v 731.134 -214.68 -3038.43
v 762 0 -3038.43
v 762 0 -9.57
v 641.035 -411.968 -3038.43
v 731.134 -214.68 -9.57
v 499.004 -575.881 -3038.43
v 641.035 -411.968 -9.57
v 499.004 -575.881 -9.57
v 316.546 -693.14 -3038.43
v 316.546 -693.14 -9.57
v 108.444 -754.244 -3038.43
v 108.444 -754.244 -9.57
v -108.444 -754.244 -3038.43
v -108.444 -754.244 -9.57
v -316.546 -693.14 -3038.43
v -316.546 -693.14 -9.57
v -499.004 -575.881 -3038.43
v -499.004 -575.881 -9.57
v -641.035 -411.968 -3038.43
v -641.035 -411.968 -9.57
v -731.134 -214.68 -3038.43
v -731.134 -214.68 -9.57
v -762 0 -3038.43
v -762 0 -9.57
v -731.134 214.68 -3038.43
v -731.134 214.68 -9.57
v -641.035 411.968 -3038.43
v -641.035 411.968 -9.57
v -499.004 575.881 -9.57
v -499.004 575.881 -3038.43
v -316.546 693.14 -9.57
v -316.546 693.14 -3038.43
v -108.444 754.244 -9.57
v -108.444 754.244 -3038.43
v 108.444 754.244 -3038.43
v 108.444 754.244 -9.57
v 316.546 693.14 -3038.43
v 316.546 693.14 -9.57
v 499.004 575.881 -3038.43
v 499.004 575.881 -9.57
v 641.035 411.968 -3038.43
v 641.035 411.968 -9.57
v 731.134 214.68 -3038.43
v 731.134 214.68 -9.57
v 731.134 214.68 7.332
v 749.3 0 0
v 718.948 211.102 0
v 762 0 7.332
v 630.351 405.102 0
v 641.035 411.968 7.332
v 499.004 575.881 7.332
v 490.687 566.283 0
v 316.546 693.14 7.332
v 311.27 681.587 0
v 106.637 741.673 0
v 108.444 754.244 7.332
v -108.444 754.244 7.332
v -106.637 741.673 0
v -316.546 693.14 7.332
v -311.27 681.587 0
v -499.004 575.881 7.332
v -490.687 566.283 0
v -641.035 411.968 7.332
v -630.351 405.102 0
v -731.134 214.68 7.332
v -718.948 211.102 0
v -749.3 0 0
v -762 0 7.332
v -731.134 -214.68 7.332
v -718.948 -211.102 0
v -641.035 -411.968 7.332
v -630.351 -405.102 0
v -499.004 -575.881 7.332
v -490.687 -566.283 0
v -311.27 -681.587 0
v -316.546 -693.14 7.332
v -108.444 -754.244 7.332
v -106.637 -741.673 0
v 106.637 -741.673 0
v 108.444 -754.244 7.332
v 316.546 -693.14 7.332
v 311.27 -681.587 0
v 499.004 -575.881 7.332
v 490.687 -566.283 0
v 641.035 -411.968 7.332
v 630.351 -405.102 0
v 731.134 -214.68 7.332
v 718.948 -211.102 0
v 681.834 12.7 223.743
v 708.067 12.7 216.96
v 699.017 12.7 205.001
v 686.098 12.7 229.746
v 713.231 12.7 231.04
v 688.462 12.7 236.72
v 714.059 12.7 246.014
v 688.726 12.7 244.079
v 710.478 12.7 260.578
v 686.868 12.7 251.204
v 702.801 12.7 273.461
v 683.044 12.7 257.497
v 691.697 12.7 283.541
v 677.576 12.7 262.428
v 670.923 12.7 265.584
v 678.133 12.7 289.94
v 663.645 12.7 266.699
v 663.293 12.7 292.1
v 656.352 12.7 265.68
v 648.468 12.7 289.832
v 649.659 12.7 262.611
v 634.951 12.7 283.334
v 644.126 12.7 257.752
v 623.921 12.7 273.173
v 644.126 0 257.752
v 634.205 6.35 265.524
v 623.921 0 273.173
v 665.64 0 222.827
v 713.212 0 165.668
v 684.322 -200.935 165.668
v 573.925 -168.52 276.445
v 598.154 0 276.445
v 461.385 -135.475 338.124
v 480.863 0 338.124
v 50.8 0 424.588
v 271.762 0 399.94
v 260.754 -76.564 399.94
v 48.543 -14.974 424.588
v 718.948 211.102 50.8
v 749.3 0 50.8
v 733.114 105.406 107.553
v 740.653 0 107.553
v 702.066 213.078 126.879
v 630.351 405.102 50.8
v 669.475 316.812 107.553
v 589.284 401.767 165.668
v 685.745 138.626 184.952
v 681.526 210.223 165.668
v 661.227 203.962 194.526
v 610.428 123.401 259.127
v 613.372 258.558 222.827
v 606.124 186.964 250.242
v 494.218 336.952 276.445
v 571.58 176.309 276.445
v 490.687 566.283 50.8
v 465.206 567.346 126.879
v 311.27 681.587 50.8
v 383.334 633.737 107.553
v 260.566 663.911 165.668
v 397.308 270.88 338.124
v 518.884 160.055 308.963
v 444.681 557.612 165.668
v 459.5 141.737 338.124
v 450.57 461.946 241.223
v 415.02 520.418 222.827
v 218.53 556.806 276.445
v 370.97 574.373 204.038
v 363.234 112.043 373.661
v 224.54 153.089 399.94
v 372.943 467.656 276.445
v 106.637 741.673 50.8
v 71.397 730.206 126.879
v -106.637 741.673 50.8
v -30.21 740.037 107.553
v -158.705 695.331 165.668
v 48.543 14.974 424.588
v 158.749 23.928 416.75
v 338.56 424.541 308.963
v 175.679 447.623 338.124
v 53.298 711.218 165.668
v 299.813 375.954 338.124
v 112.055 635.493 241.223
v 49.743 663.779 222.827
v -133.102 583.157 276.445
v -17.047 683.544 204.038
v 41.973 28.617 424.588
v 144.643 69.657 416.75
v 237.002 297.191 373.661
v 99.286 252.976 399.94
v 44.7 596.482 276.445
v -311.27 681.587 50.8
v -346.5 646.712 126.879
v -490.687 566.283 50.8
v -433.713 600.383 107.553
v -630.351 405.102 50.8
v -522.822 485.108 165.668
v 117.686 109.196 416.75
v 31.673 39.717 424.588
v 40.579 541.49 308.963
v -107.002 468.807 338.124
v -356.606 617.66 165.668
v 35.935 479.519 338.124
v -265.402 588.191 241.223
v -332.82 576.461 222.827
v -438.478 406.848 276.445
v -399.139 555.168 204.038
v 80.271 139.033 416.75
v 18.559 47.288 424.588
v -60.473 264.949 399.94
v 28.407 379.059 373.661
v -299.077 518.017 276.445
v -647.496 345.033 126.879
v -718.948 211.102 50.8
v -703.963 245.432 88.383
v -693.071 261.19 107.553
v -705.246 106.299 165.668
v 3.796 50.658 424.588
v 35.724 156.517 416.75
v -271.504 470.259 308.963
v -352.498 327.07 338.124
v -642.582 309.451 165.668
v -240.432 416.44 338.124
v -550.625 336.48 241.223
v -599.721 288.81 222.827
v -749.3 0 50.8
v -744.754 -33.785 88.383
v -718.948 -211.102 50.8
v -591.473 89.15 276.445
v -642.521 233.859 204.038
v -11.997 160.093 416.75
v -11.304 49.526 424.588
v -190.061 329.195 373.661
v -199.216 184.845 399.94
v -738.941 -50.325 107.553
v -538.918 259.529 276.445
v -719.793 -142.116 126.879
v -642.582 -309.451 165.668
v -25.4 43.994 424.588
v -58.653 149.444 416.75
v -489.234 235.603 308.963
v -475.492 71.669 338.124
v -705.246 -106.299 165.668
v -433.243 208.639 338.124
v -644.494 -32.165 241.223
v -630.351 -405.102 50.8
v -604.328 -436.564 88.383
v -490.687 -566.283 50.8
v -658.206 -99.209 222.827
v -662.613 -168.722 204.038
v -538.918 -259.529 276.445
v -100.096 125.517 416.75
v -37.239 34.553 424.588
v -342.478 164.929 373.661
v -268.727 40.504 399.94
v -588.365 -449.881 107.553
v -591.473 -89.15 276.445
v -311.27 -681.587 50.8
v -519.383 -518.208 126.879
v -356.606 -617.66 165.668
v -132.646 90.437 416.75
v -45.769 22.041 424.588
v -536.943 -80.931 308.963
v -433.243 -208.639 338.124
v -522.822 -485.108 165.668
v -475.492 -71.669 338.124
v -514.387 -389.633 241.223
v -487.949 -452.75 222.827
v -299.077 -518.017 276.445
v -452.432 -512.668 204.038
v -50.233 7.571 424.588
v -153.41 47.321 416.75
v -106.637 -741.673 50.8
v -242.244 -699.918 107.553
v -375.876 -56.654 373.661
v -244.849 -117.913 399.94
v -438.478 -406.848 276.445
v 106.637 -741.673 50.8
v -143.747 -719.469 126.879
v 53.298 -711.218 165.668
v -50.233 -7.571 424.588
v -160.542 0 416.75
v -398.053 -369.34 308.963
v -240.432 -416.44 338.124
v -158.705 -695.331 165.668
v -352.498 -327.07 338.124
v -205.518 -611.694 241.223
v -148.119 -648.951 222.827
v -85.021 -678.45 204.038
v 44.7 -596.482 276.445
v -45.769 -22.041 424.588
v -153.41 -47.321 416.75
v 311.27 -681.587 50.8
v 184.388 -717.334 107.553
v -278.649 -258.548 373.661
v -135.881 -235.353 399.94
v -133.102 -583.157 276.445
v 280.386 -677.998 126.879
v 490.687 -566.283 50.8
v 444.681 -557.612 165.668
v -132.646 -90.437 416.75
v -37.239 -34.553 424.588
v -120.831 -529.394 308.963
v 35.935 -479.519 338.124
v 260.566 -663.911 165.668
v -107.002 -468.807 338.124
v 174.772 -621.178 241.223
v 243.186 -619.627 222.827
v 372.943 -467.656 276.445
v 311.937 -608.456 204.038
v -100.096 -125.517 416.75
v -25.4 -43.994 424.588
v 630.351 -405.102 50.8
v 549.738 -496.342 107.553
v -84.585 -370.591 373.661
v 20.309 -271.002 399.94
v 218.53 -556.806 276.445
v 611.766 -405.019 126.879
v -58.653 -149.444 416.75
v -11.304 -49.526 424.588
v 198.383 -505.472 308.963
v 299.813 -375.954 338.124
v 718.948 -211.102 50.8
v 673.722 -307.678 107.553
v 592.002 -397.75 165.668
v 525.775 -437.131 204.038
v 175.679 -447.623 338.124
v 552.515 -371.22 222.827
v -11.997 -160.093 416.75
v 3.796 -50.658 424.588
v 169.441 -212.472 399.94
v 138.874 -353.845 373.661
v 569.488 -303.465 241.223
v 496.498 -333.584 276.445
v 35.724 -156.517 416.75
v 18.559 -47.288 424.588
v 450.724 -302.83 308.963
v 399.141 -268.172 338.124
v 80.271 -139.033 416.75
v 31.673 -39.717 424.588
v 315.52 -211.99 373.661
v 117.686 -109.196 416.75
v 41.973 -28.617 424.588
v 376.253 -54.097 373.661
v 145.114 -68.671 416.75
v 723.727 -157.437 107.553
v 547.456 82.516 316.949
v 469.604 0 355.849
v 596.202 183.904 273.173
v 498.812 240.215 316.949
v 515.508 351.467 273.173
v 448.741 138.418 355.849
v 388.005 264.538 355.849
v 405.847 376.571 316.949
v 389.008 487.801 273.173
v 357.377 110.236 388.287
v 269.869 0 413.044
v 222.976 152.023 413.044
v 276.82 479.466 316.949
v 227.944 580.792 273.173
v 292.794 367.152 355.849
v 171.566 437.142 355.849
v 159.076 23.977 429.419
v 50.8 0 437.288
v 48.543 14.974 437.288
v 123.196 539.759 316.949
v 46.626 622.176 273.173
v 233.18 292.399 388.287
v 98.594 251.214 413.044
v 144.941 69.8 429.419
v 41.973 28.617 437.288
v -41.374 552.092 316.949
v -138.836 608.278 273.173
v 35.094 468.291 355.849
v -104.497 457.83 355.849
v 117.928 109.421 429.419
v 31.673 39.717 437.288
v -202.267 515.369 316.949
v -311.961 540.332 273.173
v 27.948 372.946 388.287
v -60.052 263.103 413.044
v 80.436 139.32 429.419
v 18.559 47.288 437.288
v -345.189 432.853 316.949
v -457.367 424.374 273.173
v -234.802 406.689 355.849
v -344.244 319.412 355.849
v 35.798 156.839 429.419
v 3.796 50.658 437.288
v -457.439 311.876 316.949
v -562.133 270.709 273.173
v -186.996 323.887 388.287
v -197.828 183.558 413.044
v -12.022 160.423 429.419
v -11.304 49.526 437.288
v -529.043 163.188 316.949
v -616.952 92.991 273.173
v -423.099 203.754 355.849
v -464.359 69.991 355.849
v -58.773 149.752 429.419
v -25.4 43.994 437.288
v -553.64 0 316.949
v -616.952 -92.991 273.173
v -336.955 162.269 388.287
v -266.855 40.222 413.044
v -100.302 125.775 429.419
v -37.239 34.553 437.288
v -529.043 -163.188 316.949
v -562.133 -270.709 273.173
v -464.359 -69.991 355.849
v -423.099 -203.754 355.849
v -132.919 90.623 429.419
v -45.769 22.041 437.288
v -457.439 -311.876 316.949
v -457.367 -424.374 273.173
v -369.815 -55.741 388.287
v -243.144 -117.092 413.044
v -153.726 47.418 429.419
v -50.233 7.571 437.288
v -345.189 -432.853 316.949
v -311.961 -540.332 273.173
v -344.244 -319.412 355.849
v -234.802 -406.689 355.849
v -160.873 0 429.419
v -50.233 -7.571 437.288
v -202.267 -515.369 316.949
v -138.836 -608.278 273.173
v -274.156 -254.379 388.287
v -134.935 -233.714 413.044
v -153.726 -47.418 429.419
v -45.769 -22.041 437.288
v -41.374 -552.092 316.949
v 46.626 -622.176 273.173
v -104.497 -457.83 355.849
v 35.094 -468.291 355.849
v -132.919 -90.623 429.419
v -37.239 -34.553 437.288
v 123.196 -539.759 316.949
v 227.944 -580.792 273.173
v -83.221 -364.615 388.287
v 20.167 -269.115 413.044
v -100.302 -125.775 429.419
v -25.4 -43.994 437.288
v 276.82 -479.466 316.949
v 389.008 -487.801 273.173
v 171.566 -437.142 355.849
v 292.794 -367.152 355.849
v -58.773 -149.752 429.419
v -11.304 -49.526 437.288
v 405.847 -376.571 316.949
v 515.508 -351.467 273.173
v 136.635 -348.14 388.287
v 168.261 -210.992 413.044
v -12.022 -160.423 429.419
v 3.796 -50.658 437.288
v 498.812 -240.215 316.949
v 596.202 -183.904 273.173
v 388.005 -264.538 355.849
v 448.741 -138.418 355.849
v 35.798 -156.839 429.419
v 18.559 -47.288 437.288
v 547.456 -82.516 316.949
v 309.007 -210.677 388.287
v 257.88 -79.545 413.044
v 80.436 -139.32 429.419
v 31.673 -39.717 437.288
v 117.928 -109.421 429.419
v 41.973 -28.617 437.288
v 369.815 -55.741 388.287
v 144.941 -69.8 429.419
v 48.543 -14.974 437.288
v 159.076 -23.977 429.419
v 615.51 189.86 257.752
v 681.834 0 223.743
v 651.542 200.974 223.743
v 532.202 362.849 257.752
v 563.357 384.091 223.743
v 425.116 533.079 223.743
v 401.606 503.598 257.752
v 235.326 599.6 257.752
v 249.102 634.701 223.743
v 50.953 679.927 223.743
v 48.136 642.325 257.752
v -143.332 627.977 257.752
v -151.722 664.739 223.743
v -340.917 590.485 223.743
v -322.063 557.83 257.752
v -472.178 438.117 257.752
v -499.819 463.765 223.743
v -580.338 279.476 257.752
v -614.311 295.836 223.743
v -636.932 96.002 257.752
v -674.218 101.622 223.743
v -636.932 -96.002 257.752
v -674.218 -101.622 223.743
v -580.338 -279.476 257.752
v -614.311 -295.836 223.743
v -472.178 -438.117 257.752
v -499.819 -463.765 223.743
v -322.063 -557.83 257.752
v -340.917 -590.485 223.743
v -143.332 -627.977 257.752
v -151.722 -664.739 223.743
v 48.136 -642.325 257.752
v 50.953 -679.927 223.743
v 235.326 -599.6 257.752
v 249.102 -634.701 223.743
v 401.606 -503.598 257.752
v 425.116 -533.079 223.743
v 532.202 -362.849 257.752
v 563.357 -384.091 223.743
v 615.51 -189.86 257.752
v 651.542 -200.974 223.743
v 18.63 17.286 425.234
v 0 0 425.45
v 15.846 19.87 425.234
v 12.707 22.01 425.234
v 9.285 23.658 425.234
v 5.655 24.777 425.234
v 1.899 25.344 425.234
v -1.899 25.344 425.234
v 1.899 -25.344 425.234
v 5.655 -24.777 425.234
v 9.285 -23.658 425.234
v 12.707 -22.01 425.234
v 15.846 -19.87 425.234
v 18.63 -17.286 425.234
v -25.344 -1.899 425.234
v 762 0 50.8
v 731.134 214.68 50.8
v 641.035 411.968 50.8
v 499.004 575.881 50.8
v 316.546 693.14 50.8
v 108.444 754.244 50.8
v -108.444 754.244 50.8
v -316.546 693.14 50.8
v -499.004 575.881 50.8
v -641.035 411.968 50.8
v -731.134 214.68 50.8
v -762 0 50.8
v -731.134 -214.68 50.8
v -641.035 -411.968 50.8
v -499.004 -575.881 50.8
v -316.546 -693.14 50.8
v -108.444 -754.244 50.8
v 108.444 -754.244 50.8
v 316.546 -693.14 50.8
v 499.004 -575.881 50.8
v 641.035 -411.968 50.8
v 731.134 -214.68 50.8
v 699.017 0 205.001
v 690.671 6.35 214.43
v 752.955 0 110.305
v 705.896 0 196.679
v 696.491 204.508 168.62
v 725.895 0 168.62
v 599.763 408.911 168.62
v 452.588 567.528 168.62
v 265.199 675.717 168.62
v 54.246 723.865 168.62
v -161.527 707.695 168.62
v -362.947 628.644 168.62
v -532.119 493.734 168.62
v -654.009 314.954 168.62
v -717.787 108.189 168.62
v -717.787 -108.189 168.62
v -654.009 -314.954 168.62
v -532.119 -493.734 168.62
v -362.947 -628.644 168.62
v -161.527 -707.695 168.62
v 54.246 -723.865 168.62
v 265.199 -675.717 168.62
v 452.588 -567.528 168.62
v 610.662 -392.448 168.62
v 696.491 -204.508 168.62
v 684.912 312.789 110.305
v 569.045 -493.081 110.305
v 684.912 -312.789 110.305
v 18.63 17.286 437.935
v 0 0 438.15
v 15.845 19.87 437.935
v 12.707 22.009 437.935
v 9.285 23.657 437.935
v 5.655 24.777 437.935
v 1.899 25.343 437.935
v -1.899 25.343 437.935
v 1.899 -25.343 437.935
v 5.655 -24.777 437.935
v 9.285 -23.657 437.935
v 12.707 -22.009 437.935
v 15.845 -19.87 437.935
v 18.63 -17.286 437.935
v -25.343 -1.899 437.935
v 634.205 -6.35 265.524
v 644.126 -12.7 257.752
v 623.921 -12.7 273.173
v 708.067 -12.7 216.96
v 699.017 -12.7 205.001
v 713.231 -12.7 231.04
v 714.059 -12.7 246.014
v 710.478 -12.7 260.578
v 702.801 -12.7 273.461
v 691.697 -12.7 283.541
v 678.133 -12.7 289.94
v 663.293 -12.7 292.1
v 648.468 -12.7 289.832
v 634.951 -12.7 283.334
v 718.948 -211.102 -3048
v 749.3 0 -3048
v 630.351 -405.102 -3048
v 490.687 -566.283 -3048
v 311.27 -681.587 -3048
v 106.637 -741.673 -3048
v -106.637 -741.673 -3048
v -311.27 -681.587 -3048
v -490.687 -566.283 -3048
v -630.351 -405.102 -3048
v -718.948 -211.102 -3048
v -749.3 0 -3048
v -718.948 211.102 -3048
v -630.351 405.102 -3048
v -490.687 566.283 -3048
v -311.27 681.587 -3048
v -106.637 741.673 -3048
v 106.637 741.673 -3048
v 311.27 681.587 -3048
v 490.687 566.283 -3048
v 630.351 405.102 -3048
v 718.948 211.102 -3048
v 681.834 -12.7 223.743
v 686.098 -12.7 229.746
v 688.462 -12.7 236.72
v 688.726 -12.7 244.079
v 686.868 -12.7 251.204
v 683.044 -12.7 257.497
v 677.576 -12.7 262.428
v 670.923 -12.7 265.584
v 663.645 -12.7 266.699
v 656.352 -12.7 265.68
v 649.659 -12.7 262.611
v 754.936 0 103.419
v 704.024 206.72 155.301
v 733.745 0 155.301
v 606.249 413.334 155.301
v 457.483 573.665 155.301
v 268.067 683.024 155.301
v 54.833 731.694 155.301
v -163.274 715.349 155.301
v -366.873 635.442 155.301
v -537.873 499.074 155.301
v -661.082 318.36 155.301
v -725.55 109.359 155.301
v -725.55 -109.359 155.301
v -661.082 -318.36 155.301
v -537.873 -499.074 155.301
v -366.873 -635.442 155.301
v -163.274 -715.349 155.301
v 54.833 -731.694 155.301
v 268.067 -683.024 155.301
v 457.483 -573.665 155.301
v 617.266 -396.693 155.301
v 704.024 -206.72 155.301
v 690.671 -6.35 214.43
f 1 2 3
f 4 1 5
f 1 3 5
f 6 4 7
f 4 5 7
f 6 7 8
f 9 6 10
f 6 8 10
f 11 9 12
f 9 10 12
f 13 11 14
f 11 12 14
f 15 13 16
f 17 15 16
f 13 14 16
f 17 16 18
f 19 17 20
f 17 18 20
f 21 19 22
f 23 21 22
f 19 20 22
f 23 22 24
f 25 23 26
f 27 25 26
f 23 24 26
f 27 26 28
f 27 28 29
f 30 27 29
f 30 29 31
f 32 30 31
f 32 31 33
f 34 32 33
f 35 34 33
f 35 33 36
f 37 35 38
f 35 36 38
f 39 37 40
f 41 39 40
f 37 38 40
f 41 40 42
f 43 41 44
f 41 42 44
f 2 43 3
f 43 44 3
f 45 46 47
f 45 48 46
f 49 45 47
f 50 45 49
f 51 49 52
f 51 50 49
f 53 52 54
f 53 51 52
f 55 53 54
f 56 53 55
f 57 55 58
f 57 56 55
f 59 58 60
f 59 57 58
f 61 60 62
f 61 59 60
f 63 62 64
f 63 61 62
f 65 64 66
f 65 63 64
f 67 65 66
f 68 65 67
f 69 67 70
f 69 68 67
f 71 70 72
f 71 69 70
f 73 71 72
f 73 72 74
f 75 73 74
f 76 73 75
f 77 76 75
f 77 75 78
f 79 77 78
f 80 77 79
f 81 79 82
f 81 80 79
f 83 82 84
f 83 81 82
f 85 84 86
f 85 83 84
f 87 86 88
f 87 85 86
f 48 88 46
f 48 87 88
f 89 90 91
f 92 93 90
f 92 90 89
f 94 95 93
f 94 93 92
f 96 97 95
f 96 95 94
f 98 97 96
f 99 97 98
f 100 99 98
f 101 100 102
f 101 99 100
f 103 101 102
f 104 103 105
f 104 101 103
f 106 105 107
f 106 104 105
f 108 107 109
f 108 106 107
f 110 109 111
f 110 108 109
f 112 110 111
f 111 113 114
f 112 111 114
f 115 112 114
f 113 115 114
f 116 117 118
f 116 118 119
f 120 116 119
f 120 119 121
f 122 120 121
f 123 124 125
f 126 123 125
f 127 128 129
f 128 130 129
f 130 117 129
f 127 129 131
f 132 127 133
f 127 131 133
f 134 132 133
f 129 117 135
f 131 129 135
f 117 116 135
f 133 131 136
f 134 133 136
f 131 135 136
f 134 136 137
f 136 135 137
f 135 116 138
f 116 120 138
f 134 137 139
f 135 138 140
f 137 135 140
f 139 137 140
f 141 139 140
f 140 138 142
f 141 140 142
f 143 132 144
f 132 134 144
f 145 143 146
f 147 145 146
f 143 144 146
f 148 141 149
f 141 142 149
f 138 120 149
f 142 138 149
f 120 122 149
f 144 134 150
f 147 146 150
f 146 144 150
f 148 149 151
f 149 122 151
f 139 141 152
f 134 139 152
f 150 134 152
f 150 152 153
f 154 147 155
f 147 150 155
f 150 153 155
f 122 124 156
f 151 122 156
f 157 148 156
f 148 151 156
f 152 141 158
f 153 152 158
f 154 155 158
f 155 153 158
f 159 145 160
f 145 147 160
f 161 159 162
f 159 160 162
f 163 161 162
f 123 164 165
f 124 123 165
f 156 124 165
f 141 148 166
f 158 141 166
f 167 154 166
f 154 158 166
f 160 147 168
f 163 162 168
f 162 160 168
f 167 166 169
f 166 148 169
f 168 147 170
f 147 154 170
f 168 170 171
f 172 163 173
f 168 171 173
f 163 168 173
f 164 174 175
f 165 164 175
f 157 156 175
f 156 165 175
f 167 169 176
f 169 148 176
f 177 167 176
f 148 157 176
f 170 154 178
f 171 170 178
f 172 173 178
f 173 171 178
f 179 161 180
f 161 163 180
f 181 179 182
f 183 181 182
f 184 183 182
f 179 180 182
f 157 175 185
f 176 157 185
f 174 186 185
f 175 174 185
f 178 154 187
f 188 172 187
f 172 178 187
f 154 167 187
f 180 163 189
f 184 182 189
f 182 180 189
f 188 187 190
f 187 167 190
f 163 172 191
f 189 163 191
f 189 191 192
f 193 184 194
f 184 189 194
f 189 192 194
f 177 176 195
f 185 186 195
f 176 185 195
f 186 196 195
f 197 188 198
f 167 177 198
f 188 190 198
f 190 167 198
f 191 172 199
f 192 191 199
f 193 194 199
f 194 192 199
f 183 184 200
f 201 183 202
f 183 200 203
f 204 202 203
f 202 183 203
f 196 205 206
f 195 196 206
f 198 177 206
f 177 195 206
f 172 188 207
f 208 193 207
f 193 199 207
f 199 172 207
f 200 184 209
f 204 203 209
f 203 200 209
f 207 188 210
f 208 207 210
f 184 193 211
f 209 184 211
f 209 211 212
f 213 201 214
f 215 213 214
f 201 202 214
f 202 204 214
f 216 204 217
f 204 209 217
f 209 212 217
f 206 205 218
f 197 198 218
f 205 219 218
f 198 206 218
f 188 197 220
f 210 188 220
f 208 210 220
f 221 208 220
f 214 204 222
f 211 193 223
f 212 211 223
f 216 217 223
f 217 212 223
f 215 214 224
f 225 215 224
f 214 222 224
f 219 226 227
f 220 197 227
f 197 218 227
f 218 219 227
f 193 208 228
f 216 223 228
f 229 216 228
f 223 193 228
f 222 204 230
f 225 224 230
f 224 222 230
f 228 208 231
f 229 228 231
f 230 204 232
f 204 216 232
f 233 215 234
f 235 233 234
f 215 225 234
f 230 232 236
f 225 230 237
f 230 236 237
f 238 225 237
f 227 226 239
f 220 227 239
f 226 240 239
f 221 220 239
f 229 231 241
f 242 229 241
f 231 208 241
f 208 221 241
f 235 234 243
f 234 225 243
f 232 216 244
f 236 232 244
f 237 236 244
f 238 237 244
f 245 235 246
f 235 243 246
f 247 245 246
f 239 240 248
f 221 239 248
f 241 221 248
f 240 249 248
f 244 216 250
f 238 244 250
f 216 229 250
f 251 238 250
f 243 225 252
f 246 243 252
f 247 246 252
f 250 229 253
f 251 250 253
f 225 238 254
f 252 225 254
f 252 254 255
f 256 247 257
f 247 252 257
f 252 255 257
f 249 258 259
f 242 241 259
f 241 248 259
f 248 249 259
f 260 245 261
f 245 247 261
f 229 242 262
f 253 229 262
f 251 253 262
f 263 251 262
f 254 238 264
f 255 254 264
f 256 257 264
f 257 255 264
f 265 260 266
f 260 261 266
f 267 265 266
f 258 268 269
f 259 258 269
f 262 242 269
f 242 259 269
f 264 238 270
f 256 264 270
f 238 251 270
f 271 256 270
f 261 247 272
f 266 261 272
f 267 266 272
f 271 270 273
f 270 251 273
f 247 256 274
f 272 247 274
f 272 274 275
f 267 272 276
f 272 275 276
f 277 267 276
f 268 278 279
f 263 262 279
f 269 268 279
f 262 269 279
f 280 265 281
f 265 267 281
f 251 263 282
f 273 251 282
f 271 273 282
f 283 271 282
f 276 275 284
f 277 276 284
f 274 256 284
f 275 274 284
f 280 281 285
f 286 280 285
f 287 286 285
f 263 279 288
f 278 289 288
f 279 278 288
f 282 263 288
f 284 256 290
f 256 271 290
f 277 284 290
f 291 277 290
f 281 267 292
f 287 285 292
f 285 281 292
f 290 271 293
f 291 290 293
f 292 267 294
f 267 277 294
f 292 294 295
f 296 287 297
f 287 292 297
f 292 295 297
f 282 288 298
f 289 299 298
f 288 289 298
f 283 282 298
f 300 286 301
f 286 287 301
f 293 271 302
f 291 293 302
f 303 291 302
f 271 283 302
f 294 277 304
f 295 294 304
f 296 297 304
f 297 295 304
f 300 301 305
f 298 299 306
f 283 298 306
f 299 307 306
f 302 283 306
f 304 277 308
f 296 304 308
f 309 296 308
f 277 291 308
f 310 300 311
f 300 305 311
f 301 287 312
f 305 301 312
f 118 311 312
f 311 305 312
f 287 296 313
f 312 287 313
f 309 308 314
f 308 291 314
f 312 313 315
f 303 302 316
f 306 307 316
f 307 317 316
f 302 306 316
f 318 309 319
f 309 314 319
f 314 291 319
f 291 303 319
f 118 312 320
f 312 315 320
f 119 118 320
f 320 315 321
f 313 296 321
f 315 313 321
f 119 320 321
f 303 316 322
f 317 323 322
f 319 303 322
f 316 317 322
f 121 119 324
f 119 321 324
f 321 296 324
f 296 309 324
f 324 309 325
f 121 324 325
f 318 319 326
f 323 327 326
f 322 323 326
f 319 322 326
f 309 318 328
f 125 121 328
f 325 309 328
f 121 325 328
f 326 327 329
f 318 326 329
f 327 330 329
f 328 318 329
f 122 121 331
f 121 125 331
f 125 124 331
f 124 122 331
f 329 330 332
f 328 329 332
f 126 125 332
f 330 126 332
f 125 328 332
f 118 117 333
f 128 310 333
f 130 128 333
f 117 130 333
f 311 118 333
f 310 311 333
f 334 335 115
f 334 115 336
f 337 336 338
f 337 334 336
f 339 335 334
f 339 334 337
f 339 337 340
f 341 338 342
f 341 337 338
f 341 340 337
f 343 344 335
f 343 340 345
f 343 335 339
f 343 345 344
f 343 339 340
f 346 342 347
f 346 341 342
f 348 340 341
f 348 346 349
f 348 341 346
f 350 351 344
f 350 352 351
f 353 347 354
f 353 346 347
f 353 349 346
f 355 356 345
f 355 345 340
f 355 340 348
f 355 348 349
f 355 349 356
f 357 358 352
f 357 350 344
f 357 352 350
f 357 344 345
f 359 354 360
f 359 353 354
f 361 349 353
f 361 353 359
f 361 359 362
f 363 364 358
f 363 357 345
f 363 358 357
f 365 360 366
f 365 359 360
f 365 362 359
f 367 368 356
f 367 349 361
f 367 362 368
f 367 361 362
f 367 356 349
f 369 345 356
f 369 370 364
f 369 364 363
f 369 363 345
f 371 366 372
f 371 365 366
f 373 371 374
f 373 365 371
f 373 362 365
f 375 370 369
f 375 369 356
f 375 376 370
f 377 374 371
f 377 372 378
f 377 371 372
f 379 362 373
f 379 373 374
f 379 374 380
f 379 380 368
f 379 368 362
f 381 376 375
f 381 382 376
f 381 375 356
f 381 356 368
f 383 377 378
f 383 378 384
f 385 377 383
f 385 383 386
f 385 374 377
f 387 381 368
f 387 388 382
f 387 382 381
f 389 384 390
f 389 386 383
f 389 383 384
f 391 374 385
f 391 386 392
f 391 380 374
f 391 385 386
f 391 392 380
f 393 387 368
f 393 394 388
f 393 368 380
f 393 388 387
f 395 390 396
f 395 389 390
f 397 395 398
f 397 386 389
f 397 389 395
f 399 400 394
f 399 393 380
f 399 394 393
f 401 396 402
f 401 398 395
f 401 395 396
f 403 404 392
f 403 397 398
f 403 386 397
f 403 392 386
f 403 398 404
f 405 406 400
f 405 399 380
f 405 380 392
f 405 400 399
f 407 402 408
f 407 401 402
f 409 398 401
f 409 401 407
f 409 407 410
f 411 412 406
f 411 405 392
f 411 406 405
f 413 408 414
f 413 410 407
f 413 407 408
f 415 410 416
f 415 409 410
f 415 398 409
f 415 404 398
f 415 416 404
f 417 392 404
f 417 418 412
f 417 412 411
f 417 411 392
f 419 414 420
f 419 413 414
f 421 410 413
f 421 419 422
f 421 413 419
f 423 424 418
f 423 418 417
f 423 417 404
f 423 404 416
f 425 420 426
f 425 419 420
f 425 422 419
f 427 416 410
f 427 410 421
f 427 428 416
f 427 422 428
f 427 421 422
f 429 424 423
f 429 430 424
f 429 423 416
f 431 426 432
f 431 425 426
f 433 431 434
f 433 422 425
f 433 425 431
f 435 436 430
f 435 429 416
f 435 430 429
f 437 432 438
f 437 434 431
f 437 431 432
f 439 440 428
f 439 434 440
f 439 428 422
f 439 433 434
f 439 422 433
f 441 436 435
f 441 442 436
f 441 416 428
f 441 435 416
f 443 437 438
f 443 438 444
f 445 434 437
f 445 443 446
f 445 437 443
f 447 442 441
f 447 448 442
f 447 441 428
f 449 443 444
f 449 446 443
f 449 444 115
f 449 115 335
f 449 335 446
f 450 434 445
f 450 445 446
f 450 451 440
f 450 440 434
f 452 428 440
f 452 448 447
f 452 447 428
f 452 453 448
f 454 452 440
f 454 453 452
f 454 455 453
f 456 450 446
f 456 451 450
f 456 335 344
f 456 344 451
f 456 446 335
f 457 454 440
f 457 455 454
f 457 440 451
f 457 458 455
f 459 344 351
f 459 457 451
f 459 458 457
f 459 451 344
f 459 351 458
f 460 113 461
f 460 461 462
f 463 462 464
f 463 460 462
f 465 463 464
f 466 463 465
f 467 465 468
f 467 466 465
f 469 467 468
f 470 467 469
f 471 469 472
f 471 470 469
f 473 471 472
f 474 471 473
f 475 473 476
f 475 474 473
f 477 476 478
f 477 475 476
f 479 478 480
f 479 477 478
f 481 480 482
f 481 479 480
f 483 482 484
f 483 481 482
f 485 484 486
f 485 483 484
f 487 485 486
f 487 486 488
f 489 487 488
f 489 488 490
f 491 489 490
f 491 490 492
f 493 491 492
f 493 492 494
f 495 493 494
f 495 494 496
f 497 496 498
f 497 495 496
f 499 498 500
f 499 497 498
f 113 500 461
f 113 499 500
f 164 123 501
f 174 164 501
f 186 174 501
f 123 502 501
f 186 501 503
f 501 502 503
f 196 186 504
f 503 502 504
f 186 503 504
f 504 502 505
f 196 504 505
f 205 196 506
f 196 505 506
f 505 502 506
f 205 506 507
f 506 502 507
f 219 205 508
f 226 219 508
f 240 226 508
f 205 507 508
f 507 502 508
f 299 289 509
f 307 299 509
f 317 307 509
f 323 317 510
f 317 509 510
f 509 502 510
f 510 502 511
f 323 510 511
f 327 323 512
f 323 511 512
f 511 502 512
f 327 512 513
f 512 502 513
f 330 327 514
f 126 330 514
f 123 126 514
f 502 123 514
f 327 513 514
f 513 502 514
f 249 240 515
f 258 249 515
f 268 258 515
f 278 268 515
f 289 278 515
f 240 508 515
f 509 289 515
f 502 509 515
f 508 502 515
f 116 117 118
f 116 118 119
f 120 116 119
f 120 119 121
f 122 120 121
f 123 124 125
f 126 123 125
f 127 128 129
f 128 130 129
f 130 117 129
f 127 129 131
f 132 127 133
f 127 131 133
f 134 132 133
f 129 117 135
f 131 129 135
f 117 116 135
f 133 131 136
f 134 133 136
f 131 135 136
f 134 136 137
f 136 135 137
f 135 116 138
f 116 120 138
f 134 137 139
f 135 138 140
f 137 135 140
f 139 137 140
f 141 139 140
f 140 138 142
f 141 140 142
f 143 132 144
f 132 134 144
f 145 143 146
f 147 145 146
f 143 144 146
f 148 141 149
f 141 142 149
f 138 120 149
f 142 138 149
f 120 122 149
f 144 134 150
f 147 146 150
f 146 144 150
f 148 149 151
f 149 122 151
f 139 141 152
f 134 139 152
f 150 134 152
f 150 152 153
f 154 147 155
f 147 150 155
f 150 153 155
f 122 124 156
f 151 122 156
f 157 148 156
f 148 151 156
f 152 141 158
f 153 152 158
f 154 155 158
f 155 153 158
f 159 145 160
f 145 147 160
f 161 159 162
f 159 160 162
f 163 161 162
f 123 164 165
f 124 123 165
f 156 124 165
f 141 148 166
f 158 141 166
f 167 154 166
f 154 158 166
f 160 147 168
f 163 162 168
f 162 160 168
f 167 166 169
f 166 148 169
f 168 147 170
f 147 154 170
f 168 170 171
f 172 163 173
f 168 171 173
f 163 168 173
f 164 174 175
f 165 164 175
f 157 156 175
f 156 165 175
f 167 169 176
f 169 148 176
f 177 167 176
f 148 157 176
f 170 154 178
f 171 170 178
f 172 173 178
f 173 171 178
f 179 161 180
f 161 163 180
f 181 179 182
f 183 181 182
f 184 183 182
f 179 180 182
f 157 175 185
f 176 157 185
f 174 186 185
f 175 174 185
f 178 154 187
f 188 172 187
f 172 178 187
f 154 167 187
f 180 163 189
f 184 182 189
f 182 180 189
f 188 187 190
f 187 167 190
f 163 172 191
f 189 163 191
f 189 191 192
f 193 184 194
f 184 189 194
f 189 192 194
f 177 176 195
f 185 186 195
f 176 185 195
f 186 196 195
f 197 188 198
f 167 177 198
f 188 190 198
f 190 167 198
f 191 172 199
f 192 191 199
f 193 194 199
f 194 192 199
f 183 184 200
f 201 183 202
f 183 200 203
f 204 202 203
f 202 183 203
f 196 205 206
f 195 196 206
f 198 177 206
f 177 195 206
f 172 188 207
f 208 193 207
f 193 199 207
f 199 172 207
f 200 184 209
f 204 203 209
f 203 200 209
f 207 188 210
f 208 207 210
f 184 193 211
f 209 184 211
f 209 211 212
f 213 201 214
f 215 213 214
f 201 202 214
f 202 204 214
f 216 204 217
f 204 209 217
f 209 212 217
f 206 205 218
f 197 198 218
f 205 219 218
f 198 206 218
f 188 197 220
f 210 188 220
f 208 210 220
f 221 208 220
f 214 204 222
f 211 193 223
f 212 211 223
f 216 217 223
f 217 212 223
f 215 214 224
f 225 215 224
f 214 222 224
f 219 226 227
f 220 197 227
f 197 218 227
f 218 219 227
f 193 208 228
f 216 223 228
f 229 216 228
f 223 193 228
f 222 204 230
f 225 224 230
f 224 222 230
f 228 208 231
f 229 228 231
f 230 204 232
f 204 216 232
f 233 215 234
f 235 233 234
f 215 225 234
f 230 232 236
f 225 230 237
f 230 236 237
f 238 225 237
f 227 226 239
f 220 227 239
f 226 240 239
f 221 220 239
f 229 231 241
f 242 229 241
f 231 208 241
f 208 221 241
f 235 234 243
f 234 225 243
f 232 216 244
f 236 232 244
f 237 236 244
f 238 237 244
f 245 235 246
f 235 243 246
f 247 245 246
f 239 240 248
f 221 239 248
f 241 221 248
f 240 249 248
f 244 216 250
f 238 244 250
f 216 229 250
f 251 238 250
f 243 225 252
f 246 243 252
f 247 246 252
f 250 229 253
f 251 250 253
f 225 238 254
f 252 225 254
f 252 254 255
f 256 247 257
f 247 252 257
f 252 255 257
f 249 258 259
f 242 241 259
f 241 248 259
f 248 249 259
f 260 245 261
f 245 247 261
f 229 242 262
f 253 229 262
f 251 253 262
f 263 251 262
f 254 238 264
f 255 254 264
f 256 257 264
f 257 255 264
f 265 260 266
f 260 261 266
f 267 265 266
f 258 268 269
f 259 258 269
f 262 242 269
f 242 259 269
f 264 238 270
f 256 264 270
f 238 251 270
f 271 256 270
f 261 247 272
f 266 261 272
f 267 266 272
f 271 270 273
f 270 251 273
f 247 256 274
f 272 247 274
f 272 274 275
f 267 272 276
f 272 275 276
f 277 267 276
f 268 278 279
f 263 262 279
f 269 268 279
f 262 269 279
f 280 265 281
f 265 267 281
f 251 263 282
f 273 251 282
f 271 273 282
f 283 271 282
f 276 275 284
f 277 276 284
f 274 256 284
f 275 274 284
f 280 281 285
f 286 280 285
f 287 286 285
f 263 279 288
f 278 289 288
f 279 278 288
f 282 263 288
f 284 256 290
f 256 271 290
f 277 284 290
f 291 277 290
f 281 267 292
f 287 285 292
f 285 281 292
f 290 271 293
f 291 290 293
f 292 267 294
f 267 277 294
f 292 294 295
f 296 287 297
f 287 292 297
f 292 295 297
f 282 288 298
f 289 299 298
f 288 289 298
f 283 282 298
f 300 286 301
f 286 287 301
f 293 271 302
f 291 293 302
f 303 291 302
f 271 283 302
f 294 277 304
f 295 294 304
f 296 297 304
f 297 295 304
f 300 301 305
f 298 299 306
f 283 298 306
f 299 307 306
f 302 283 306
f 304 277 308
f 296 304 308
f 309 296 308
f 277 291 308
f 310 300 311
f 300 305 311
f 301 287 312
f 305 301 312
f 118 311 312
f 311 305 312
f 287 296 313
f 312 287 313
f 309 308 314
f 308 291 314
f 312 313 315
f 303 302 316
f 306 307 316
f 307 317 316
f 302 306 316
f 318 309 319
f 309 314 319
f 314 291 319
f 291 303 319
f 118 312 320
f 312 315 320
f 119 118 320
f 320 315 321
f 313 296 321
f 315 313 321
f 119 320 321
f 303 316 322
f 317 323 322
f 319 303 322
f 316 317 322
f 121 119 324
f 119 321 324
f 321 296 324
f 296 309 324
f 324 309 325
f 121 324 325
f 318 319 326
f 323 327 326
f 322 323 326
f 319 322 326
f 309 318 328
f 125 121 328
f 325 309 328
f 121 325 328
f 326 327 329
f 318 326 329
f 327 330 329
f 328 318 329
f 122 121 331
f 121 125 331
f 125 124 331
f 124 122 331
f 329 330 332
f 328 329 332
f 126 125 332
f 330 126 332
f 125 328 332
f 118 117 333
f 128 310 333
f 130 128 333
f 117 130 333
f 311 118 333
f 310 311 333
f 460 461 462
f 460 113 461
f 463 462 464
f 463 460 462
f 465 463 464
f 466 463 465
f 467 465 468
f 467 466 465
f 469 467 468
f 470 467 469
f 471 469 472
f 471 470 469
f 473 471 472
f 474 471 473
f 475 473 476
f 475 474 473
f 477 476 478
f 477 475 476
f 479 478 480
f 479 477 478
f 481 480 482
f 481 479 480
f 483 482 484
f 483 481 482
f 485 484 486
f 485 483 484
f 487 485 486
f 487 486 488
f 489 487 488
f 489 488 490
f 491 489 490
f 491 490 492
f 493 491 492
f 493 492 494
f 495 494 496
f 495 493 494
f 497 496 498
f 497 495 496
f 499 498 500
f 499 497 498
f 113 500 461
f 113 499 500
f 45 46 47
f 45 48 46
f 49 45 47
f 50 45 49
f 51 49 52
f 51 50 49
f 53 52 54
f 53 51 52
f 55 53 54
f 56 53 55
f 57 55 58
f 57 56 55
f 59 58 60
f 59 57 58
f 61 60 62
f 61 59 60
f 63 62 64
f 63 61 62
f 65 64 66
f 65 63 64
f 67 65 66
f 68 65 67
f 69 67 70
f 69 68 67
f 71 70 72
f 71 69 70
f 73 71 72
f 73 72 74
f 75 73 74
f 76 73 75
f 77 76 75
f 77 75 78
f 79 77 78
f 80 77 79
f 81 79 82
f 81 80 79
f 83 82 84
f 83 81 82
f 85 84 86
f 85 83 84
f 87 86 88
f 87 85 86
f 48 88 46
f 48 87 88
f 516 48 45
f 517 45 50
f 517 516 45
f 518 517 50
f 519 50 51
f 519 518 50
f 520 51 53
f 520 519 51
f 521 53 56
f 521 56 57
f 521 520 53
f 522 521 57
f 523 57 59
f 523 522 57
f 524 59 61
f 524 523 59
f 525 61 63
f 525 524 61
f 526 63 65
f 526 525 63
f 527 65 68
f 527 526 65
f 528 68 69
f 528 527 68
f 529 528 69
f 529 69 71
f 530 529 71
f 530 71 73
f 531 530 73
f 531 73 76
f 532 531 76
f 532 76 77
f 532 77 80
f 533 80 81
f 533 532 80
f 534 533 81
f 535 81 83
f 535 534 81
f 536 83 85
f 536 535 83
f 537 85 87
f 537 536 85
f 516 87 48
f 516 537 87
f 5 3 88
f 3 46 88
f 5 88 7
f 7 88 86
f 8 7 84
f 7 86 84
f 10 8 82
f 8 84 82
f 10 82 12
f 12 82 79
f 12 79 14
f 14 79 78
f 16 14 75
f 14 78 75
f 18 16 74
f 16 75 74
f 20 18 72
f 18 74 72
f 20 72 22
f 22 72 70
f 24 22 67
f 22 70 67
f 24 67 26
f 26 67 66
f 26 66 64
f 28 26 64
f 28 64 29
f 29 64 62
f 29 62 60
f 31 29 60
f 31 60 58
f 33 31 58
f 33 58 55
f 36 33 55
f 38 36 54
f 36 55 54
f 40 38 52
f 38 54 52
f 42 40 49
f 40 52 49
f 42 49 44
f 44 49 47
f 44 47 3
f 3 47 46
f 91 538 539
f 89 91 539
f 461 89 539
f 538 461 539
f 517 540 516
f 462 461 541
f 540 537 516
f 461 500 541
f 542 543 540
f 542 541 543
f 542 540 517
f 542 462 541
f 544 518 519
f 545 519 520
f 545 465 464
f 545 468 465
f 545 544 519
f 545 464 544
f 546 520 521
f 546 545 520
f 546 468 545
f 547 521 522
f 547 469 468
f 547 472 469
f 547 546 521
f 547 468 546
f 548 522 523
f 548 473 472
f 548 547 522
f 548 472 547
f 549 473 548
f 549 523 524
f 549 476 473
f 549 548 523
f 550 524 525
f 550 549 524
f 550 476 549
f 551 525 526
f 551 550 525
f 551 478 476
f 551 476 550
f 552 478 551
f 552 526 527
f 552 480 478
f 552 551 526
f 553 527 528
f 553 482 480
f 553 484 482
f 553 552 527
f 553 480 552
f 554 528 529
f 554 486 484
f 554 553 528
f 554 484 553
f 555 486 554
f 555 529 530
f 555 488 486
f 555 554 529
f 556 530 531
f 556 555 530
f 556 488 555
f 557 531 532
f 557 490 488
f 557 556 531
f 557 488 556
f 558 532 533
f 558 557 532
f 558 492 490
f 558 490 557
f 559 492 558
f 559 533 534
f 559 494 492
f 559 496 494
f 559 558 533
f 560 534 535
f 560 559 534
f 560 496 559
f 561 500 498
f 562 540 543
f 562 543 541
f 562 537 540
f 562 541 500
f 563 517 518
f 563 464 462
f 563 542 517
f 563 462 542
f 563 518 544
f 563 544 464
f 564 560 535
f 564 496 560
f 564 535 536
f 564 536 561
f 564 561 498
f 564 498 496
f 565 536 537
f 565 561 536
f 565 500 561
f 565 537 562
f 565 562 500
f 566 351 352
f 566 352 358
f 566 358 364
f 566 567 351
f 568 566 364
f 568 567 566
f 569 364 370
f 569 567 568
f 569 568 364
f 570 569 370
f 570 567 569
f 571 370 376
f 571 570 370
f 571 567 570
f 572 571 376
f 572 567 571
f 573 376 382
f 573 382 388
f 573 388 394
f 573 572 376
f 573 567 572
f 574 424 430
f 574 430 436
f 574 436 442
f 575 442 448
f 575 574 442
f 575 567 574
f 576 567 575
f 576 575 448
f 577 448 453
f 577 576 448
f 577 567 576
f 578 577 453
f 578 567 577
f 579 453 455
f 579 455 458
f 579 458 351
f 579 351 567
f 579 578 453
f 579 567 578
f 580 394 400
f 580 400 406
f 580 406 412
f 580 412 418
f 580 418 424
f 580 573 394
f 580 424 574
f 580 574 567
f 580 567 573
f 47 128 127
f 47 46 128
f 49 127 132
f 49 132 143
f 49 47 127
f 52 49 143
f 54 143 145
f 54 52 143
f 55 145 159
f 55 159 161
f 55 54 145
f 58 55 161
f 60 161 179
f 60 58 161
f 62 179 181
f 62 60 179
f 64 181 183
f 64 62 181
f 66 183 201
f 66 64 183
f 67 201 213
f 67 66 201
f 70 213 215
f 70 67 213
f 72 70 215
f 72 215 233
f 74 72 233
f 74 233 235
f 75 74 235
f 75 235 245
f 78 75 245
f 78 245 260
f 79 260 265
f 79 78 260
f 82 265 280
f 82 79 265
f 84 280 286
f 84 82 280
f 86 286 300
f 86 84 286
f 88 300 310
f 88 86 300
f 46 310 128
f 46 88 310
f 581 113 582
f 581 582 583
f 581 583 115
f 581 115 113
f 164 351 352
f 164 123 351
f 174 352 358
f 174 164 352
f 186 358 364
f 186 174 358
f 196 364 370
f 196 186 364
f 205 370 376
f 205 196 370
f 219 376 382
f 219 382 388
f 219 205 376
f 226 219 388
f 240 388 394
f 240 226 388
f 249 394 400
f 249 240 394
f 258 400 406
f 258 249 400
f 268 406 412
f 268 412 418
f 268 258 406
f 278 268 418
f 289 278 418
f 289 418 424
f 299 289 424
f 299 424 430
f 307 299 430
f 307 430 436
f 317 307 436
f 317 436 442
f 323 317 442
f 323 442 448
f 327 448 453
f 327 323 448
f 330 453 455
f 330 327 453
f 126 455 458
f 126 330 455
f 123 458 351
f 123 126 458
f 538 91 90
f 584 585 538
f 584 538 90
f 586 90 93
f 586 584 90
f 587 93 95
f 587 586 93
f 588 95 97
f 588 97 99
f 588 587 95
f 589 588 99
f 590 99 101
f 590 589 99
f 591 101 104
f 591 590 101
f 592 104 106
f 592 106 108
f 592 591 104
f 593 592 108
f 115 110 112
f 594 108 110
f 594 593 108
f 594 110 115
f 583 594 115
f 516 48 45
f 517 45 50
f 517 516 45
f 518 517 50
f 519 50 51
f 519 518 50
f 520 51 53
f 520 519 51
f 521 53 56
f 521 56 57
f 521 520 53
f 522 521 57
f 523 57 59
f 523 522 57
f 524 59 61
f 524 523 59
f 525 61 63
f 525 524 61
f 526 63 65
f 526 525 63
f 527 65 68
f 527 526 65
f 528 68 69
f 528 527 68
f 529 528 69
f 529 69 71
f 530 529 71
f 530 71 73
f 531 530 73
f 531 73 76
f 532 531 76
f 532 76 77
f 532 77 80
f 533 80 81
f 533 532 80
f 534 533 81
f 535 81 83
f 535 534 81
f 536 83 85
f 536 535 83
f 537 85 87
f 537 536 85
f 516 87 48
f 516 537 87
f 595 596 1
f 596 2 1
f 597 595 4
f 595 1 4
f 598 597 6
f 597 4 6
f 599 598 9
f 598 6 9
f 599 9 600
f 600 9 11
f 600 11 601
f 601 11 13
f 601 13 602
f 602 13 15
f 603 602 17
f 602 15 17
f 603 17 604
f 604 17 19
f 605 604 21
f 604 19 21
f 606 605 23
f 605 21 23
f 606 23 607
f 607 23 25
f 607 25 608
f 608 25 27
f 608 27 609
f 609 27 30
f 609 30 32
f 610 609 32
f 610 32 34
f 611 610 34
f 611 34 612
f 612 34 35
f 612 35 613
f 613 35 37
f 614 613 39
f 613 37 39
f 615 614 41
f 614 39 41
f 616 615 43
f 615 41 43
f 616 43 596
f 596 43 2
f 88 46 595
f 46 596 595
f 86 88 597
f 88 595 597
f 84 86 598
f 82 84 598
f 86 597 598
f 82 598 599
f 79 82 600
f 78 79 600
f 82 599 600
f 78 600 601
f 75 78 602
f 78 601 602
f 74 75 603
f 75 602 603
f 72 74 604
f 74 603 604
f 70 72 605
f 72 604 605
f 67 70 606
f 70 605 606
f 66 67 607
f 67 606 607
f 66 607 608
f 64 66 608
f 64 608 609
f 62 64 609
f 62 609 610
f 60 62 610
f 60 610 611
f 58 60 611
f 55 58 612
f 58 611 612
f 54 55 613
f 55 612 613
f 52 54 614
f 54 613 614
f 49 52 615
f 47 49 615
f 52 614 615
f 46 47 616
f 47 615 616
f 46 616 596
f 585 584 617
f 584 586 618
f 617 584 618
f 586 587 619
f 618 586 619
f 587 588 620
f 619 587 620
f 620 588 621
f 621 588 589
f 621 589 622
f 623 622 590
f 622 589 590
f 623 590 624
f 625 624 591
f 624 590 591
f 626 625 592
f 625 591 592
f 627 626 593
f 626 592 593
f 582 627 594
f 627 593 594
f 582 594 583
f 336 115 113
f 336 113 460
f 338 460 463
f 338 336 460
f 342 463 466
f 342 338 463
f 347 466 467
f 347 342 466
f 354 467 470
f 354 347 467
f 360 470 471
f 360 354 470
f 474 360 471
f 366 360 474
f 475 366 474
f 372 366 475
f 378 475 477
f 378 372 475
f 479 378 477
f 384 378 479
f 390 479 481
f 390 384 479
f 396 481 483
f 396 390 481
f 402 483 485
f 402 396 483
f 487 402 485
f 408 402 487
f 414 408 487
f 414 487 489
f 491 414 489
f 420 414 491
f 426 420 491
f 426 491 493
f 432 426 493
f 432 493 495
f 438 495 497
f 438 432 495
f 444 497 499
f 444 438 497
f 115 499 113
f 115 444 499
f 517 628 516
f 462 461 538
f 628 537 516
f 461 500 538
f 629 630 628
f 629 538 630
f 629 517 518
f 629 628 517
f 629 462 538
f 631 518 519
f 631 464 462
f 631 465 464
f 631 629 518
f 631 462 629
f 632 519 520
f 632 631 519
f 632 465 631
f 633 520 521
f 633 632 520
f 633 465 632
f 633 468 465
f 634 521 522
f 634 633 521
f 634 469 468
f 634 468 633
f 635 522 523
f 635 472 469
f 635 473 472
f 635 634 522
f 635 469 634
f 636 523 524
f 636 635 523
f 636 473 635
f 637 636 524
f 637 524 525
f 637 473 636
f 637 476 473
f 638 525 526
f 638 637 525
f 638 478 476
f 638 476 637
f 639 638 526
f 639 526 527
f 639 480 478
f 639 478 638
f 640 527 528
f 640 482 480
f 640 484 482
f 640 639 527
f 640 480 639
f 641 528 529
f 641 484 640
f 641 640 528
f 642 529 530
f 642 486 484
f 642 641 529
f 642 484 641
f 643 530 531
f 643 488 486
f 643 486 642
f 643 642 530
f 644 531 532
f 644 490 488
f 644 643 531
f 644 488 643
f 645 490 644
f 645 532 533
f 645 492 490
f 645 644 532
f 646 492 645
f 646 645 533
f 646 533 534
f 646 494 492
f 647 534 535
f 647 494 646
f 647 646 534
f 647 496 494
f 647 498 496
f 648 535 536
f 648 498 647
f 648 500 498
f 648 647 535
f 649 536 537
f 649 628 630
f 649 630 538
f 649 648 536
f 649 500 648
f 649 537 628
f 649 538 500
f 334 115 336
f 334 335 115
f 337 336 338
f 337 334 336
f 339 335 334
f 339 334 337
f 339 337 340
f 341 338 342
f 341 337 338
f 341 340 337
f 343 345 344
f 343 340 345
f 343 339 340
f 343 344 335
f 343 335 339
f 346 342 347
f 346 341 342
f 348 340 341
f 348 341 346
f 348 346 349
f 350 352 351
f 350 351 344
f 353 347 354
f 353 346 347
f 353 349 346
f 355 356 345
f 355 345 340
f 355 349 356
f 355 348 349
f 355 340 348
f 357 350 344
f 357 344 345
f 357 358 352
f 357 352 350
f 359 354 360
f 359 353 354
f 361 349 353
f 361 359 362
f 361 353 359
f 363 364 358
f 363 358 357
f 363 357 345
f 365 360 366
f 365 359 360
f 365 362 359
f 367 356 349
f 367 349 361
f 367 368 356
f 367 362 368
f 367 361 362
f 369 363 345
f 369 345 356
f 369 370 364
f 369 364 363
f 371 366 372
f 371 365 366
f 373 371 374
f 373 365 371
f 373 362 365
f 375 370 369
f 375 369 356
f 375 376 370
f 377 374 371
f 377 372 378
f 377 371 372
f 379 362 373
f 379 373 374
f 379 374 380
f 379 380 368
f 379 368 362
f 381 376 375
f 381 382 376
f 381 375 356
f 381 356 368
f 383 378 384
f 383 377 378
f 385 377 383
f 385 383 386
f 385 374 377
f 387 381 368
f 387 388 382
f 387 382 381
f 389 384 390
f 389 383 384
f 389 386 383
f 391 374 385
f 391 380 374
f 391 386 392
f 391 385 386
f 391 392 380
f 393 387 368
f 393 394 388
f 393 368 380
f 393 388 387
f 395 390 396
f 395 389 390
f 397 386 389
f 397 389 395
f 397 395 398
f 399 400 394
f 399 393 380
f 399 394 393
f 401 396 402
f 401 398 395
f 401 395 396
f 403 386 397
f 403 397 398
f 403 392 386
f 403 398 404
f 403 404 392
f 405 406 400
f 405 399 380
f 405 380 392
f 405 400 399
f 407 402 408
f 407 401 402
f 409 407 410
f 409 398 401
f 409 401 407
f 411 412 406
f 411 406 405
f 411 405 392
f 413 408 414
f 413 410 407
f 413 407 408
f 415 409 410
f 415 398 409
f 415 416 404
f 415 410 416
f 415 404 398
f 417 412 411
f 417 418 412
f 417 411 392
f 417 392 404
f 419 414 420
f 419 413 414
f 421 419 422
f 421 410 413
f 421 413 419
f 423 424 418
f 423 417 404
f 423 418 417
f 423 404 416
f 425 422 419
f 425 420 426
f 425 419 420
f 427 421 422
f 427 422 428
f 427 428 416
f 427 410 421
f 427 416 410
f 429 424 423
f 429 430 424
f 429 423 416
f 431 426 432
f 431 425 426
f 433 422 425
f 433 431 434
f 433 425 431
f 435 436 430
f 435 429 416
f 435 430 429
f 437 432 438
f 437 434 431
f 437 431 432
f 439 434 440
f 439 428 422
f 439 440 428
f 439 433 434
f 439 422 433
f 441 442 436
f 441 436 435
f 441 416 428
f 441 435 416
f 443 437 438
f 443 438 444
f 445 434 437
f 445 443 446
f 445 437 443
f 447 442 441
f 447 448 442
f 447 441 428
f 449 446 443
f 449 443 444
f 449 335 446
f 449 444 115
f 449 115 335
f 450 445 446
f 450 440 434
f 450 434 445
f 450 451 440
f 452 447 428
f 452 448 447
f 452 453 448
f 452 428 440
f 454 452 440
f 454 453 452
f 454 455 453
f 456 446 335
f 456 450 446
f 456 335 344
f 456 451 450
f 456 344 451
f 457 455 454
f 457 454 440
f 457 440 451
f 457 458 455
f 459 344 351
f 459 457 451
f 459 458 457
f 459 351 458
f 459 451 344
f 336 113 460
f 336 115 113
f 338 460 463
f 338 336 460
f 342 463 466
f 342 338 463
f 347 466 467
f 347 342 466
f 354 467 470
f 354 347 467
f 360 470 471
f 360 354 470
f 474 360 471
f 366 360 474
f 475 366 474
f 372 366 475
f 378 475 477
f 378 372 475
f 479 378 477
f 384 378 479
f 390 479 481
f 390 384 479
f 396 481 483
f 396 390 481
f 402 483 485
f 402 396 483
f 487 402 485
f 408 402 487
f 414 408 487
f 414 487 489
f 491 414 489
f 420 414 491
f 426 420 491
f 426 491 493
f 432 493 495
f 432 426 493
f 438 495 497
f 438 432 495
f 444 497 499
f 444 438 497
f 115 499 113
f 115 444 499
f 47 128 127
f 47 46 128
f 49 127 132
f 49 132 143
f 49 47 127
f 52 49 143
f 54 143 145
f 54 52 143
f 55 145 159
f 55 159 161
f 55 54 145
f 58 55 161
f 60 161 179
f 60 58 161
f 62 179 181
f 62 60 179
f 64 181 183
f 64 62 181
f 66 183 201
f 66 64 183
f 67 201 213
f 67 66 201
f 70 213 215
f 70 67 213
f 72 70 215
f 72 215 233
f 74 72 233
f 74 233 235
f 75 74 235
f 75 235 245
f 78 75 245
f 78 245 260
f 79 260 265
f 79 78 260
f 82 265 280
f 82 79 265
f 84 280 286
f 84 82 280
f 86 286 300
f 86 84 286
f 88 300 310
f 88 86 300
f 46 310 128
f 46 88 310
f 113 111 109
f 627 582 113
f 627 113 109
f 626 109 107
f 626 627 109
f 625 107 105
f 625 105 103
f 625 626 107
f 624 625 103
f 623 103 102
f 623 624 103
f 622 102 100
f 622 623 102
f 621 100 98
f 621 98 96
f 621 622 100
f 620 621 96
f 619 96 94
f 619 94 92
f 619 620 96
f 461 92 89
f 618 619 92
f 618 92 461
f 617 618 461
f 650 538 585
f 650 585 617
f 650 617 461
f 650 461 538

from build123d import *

# Parameters (mm, degrees)
F2_DEPTH = 12.7


with BuildPart() as f1:
    # F0 (on Front) → F1 (revolve)
    with BuildSketch(Plane.XZ):
        with BuildLine():
            Line((749.3, 50.8), (749.3, 0))
            Line((749.3, 0), (762, 7.3323484187))
            Line((762, 7.3323484187), (762, 50.8))
            add(Edge.make_bspline(
                [(762, 50.8), (762, 131.2241999089), (699.0172358285, 205.0009740743)],
                knots=[0, 0, 0, 0.4094360974, 0.4094360974, 0.4094360974], degree=2, weights=[1, 0.9791183416, 1]))
            add(Edge.make_bspline(
                [(699.0172358285, 205.0009740743), (690.9176289865, 214.4886946066), (681.8335632743, 223.7431821446)],
                knots=[0.4094360974, 0.4094360974, 0.4094360974, 0.4628251519, 0.4628251519, 0.4628251519], degree=2, weights=[1, 0.9996437223, 1]))
            add(Edge.make_bspline(
                [(681.8335632743, 223.7431821446), (664.6677239017, 241.2310616458), (644.1262863112, 257.7518131682)],
                knots=[0.4628251519, 0.4628251519, 0.4628251519, 0.5636510386, 0.5636510386, 0.5636510386], degree=2, weights=[1, 0.9987295367, 1]))
            add(Edge.make_bspline(
                [(644.1262863112, 257.7518131682), (634.3865563599, 265.5851333879), (623.9210747916, 273.1727348794)],
                knots=[0.5636510386, 0.5636510386, 0.5636510386, 0.6114890844, 0.6114890844, 0.6114890844], degree=2, weights=[1, 0.9997139538, 1]))
            add(Edge.make_bspline(
                [(623.9210747916, 273.1727348794), (414.6015402479, 424.9319446319), (50.8, 437.2882636712)],
                knots=[0.6114890844, 0.6114890844, 0.6114890844, 1.5040801784, 1.5040801784, 1.5040801784], degree=2, weights=[1, 0.9020522297, 1]))
            Line((50.8, 437.2882636712), (50.8, 424.5879913801))
            add(Edge.make_bspline(
                [(749.3, 50.8), (749.3, 400.8554204989), (50.8, 424.5879913801)],
                knots=[0, 0, 0, 1.5029476724, 1.5029476724, 1.5029476724], degree=2, weights=[1, 0.7306834507, 1]))
        make_face()
    revolve(axis=Axis((0, 0, 238.125), (0, 0, 1)))

    # F0 (on Front) → F2 (join, symmetric)
    with BuildSketch(Plane.XZ):
        with BuildLine():
            add(Edge.make_bspline(
                [(699.0172358285, 205.0009740743), (690.9176289865, 214.4886946066), (681.8335632743, 223.7431821446)],
                knots=[0.4094360974, 0.4094360974, 0.4094360974, 0.4628251519, 0.4628251519, 0.4628251519], degree=2, weights=[1, 0.9996437223, 1]))
            ThreePointArc((699.0172358285, 205.0009740743), (697.6232713112, 278.913247184), (623.9210747916, 273.1727348794))
            add(Edge.make_bspline(
                [(644.1262863112, 257.7518131682), (634.3865563599, 265.5851333879), (623.9210747916, 273.1727348794)],
                knots=[0.5636510386, 0.5636510386, 0.5636510386, 0.6114890844, 0.6114890844, 0.6114890844], degree=2, weights=[1, 0.9997139538, 1]))
            ThreePointArc((644.1262863112, 257.7518131682), (680.4898484335, 260.1617322331), (681.8335632743, 223.7431821446))
        make_face()
    extrude(amount=F2_DEPTH, both=True)


with BuildPart() as f4:
    # F3 (on Front) → F4 (revolve)
    with BuildSketch(Plane.XZ):
        Polygon((762, -9.5701364363), (749.3, 0), (749.3, -3048), (762, -3038.4298635637), align=None)
    revolve(axis=Axis((0, 0, -1524), (0, 0, -1)))


with BuildPart() as f5:
    # F0 (on Front) → F5 (revolve)
    with BuildSketch(Plane.XZ):
        with BuildLine():
            add(Edge.make_bspline(
                [(50.8, 424.5879913801), (25.4292542859, 425.45), (0, 425.45)],
                knots=[1.5029476724, 1.5029476724, 1.5029476724, 1.5707963268, 1.5707963268, 1.5707963268], degree=2, weights=[1, 0.9994246252, 1]))
            Line((50.8, 424.5879913801), (50.8, 437.2882636712))
            add(Edge.make_bspline(
                [(50.8, 437.2882636712), (25.428285113, 438.15), (0, 438.15)],
                knots=[1.5040801784, 1.5040801784, 1.5040801784, 1.5707963268, 1.5707963268, 1.5707963268], degree=2, weights=[1, 0.999443671, 1]))
            Line((0, 438.15), (0, 425.45))
        make_face()
        with BuildLine():
            Line((749.3, 50.8), (749.3, 0))
            Line((749.3, 0), (762, 7.3323484187))
            Line((762, 7.3323484187), (762, 50.8))
            add(Edge.make_bspline(
                [(762, 50.8), (762, 131.2241999089), (699.0172358285, 205.0009740743)],
                knots=[0, 0, 0, 0.4094360974, 0.4094360974, 0.4094360974], degree=2, weights=[1, 0.9791183416, 1]))
            add(Edge.make_bspline(
                [(699.0172358285, 205.0009740743), (690.9176289865, 214.4886946066), (681.8335632743, 223.7431821446)],
                knots=[0.4094360974, 0.4094360974, 0.4094360974, 0.4628251519, 0.4628251519, 0.4628251519], degree=2, weights=[1, 0.9996437223, 1]))
            add(Edge.make_bspline(
                [(681.8335632743, 223.7431821446), (664.6677239017, 241.2310616458), (644.1262863112, 257.7518131682)],
                knots=[0.4628251519, 0.4628251519, 0.4628251519, 0.5636510386, 0.5636510386, 0.5636510386], degree=2, weights=[1, 0.9987295367, 1]))
            add(Edge.make_bspline(
                [(644.1262863112, 257.7518131682), (634.3865563599, 265.5851333879), (623.9210747916, 273.1727348794)],
                knots=[0.5636510386, 0.5636510386, 0.5636510386, 0.6114890844, 0.6114890844, 0.6114890844], degree=2, weights=[1, 0.9997139538, 1]))
            add(Edge.make_bspline(
                [(623.9210747916, 273.1727348794), (414.6015402479, 424.9319446319), (50.8, 437.2882636712)],
                knots=[0.6114890844, 0.6114890844, 0.6114890844, 1.5040801784, 1.5040801784, 1.5040801784], degree=2, weights=[1, 0.9020522297, 1]))
            Line((50.8, 437.2882636712), (50.8, 424.5879913801))
            add(Edge.make_bspline(
                [(749.3, 50.8), (749.3, 400.8554204989), (50.8, 424.5879913801)],
                knots=[0, 0, 0, 1.5029476724, 1.5029476724, 1.5029476724], degree=2, weights=[1, 0.7306834507, 1]))
        make_face()
    revolve(axis=Axis((0, 0, 238.125), (0, 0, 1)))


solid = Compound([f1.part, f4.part, f5.part])
